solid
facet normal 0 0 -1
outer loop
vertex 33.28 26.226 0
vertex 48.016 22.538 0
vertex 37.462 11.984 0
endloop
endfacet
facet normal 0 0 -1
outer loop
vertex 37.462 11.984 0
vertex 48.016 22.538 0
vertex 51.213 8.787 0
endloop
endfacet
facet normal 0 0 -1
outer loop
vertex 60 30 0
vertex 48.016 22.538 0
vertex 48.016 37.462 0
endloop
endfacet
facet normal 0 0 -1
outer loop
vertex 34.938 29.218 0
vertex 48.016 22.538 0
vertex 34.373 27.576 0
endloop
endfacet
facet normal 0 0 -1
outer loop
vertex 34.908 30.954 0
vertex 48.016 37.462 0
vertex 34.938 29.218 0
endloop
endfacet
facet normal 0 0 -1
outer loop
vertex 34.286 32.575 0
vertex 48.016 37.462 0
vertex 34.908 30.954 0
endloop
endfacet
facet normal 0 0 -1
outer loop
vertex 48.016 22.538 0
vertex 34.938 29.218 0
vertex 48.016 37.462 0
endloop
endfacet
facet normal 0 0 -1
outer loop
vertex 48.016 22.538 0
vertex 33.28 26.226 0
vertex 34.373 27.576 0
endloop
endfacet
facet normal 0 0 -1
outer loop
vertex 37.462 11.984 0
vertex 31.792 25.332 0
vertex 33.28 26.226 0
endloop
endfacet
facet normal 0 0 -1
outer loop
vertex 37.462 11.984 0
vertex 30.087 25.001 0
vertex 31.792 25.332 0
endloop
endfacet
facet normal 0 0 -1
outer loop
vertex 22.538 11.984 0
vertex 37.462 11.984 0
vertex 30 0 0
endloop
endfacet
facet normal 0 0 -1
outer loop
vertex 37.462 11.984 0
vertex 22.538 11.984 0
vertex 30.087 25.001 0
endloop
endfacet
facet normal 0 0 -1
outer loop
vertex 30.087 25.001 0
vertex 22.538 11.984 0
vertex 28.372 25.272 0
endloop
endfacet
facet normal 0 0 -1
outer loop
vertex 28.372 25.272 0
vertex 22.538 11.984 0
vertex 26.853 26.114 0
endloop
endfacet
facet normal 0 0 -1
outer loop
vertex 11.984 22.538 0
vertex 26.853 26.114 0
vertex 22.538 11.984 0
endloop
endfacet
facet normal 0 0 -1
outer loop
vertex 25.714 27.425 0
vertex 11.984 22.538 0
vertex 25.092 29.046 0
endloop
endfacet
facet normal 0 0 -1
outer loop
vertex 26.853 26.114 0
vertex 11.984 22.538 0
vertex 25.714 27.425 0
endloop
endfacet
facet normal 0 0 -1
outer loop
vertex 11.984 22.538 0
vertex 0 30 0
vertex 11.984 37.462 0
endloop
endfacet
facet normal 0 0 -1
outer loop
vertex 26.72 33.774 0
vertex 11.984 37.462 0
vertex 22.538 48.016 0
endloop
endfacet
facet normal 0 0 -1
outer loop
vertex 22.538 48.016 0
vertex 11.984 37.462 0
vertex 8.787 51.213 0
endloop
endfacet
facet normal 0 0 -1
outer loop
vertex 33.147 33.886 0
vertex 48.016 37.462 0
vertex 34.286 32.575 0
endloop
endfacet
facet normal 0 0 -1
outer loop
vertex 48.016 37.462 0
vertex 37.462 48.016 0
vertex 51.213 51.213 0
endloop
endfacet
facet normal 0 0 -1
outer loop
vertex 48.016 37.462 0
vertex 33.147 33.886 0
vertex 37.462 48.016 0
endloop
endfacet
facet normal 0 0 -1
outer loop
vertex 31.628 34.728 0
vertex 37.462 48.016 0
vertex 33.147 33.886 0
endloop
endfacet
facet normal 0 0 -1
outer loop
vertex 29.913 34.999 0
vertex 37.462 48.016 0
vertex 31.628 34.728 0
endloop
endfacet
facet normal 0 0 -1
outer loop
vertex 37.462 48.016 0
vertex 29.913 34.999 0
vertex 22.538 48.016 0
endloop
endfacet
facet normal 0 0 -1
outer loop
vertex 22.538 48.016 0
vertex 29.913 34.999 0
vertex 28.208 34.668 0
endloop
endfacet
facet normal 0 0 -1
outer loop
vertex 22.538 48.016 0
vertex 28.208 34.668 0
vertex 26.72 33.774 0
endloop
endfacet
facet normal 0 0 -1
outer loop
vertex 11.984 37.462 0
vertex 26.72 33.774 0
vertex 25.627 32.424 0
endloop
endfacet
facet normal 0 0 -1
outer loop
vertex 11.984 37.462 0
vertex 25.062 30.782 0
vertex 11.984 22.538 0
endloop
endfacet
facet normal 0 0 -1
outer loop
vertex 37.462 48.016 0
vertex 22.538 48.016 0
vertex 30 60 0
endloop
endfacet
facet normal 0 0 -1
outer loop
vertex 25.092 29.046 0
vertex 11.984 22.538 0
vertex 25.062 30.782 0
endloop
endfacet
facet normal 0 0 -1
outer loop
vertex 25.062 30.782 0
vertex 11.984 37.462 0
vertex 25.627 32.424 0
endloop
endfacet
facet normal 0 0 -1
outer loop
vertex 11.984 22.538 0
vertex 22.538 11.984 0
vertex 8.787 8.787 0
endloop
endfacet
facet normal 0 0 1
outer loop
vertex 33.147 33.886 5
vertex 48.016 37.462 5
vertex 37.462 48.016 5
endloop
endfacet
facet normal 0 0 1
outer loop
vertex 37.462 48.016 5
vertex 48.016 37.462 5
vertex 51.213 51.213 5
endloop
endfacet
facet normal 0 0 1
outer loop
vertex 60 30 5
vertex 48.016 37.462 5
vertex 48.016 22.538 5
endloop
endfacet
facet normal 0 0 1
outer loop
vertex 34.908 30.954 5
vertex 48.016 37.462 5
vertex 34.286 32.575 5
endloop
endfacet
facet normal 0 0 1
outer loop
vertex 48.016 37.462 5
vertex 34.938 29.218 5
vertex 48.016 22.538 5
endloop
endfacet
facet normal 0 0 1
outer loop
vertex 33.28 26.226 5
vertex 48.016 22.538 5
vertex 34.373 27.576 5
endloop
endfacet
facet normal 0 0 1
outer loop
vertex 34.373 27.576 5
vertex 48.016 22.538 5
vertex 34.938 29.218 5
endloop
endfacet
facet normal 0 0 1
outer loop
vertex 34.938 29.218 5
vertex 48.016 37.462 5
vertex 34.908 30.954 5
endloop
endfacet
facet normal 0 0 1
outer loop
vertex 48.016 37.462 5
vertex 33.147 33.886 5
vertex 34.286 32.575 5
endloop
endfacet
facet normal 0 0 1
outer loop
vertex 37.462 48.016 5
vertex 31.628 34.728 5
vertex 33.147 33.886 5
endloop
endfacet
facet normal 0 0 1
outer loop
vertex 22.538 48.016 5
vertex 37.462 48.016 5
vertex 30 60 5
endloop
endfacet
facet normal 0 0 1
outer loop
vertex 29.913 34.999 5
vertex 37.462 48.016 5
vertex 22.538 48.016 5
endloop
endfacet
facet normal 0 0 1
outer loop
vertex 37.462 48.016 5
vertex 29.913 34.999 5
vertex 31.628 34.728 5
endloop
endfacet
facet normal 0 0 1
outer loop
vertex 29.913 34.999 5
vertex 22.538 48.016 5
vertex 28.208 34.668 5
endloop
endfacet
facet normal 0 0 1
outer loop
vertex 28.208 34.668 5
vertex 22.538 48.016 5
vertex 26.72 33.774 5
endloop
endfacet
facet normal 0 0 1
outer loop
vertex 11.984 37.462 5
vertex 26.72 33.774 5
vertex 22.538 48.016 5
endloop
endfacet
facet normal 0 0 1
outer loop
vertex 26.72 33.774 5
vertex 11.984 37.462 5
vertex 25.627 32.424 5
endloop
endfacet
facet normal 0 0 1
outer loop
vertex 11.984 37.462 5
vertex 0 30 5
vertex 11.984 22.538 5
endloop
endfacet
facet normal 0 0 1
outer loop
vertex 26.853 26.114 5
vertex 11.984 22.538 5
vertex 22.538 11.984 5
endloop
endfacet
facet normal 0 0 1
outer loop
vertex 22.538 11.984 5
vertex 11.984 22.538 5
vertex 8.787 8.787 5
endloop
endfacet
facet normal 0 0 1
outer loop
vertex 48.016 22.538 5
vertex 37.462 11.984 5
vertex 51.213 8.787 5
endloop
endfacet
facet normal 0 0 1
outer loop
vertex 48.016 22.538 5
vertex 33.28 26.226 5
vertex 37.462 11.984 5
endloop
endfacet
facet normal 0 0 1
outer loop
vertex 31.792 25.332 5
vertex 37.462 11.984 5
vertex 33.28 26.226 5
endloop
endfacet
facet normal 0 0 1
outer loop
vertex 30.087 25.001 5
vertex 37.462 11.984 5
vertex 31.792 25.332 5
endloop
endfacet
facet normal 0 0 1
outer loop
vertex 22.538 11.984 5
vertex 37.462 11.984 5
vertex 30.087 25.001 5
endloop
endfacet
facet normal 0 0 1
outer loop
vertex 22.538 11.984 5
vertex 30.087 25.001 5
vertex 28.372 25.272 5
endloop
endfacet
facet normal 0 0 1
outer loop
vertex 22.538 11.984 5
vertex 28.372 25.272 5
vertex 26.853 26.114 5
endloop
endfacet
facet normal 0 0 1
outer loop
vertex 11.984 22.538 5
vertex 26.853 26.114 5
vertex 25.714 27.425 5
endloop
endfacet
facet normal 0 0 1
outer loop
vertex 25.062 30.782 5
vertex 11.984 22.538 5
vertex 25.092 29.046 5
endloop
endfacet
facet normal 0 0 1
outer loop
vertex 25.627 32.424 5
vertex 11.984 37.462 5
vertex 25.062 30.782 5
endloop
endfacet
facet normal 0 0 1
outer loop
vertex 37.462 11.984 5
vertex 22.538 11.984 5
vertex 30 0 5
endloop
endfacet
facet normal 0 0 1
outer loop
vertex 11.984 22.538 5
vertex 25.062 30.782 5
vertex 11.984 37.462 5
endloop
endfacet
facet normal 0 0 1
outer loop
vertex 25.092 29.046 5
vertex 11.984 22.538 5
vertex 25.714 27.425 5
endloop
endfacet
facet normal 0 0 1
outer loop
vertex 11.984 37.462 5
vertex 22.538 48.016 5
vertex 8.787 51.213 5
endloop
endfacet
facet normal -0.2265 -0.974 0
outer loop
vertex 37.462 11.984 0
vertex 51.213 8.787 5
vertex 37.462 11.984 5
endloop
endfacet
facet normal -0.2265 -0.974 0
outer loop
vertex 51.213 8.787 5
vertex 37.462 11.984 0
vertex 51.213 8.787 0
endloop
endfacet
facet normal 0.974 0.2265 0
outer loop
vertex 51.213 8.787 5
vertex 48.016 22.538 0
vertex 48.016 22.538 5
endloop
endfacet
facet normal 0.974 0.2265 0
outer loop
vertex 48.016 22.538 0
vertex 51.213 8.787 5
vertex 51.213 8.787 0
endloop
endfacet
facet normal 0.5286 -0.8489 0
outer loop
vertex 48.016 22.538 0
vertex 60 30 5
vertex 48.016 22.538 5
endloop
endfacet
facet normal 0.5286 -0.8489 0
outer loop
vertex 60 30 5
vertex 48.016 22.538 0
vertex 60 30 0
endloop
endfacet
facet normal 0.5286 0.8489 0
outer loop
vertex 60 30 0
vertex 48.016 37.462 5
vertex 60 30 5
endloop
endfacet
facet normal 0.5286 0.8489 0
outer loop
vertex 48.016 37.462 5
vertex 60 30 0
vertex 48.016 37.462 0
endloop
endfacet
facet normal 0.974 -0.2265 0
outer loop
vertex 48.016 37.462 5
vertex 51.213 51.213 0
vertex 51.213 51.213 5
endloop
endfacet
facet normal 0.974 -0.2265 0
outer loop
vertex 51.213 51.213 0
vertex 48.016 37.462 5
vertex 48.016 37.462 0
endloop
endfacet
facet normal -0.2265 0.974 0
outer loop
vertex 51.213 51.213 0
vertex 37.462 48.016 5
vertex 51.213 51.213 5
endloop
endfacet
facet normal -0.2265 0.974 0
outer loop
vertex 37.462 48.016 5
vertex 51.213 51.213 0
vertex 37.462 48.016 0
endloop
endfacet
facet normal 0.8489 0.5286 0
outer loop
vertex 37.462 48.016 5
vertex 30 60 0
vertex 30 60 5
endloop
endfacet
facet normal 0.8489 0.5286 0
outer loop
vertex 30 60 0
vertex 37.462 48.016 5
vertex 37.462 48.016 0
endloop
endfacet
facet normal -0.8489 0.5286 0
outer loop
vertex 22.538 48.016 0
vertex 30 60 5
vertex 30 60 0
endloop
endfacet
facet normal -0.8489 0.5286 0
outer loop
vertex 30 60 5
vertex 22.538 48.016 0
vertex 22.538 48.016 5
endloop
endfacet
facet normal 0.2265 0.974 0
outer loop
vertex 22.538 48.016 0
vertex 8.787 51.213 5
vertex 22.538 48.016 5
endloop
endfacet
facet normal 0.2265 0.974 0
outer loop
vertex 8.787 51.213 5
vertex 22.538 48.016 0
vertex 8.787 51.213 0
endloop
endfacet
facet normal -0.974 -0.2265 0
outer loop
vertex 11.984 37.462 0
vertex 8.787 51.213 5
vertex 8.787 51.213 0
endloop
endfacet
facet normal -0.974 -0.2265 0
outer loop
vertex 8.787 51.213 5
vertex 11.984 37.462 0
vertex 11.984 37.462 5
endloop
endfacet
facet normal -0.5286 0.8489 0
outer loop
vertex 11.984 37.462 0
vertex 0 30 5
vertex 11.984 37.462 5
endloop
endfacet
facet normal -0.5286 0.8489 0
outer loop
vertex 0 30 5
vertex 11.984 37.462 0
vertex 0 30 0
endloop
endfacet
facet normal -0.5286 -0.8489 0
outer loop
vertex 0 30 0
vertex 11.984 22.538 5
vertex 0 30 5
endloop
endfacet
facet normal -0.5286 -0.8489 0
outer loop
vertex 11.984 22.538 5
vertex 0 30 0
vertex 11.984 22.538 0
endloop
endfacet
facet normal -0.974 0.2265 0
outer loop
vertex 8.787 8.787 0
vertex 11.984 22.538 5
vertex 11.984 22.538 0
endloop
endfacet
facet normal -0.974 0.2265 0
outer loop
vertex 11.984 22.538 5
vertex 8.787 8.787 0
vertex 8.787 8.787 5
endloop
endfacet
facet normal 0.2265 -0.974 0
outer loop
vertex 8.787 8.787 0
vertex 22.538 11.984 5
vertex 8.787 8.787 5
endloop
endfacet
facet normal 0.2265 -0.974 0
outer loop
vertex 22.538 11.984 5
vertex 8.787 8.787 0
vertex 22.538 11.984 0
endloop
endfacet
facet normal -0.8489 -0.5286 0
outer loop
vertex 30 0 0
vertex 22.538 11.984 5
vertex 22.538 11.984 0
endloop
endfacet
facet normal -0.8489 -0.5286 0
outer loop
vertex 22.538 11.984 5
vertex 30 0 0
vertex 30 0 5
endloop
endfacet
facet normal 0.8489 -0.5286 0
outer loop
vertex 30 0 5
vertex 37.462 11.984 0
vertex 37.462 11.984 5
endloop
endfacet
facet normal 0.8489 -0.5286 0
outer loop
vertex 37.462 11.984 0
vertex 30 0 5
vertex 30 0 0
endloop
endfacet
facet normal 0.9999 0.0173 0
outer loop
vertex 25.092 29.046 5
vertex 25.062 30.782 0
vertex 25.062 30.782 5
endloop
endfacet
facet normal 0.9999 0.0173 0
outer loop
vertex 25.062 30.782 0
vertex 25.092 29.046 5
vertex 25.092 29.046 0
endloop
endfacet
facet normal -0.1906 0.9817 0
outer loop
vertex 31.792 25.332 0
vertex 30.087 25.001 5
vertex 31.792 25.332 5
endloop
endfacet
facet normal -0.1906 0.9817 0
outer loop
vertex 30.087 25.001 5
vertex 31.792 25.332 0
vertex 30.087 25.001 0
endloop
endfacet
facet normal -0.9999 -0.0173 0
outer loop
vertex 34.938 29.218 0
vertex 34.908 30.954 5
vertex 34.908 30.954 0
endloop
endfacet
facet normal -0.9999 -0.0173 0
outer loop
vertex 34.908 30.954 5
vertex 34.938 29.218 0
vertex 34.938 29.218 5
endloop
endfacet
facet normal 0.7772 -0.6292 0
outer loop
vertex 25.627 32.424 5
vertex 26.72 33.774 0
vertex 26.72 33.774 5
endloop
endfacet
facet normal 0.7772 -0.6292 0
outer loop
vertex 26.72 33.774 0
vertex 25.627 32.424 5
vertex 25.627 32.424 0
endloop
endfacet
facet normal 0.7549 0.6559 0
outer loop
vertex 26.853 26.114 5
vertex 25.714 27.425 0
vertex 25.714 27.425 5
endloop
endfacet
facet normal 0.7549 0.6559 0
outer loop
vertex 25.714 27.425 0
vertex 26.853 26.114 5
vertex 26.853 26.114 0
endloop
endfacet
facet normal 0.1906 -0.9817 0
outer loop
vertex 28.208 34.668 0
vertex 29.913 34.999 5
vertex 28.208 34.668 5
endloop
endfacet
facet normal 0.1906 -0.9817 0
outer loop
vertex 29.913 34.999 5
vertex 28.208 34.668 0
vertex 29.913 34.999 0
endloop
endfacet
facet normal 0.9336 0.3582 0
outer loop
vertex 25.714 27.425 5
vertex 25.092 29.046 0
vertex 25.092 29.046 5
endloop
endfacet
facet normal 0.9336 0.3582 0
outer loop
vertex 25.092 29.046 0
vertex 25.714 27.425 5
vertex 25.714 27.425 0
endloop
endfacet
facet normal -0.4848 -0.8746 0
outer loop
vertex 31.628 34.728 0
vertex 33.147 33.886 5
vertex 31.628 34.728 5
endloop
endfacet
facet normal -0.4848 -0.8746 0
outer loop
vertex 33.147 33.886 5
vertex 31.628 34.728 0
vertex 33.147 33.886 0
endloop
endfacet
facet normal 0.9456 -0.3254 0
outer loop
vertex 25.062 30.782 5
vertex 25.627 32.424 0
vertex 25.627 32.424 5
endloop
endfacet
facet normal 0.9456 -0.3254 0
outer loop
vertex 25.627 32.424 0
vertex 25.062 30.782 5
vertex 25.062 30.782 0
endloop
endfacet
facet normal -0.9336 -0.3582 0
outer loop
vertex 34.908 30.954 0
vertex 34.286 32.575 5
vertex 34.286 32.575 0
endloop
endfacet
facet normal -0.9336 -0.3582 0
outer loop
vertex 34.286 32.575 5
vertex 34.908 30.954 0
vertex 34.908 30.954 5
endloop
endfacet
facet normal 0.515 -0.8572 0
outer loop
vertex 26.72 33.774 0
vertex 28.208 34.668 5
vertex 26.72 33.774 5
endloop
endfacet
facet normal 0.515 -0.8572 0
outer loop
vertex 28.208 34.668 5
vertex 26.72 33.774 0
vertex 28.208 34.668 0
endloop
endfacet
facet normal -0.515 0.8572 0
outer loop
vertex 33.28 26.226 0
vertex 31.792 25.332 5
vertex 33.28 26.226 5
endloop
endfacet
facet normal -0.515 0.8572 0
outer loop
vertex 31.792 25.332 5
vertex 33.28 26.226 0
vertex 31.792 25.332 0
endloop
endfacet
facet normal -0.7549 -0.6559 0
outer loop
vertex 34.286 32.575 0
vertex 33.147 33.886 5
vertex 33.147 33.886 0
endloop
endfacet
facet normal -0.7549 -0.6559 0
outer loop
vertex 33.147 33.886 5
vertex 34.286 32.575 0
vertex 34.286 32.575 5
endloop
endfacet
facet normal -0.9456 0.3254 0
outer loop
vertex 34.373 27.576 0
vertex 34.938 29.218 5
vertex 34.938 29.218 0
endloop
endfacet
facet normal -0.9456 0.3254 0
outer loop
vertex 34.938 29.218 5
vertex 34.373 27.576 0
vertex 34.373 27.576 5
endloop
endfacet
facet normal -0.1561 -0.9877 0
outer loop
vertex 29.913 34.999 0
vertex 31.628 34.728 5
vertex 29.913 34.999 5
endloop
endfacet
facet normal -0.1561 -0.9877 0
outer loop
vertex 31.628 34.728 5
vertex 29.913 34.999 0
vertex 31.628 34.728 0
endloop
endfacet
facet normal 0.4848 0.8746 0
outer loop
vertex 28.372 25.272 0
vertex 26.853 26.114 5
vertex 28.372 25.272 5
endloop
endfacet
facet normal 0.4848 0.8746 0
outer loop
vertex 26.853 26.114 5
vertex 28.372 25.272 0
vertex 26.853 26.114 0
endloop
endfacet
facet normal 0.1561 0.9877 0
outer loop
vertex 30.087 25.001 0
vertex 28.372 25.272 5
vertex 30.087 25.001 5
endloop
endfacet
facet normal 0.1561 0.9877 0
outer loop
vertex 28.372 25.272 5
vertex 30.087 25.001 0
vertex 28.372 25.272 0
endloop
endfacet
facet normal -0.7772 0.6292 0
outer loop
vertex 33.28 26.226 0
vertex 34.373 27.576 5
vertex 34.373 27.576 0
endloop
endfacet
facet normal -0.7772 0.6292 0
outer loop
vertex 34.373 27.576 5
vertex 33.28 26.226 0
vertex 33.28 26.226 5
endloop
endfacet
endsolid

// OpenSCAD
$fn = 32;

// ----------------------------------------------------------------------
// Star wheel: 8-point blunt, R30
// ----------------------------------------------------------------------

// --- parameters (mm) ---
n_points = 8;             // number of points / teeth
r_out = 30;               // tip radius
r_in = 19.5;              // root radius
bore_r = 5;               // centre bore radius
plate_t = 5;              // plate thickness, Z (extrusion height)
bore_d = 10;              // centre bore diameter

profile = [[60, 30], [48.016, 37.462], [51.213, 51.213], [37.462, 48.016], [30, 60], [22.538, 48.016], [8.787, 51.213], [11.984, 37.462], [0, 30], [11.984, 22.538], [8.787, 8.787], [22.538, 11.984], [30, 0], [37.462, 11.984], [51.213, 8.787], [48.016, 22.538]];  // primary outline, 16 points, counter clockwise
void_1 = [[34.908, 30.954], [34.286, 32.575], [33.147, 33.886], [31.628, 34.728], [29.913, 34.999], [28.208, 34.668], [26.72, 33.774], [25.627, 32.424], [25.062, 30.782], [25.092, 29.046], [25.714, 27.425], [26.853, 26.114], [28.372, 25.272], [30.087, 25.001], [31.792, 25.332], [33.28, 26.226], [34.373, 27.576], [34.938, 29.218]];  // centre bore, 18 points

// --- the one profile operation ---
difference() {
  linear_extrude(height = plate_t) polygon(points = profile);
  translate([0, 0, -1])
    linear_extrude(height = plate_t + 2) polygon(points = void_1);
}
